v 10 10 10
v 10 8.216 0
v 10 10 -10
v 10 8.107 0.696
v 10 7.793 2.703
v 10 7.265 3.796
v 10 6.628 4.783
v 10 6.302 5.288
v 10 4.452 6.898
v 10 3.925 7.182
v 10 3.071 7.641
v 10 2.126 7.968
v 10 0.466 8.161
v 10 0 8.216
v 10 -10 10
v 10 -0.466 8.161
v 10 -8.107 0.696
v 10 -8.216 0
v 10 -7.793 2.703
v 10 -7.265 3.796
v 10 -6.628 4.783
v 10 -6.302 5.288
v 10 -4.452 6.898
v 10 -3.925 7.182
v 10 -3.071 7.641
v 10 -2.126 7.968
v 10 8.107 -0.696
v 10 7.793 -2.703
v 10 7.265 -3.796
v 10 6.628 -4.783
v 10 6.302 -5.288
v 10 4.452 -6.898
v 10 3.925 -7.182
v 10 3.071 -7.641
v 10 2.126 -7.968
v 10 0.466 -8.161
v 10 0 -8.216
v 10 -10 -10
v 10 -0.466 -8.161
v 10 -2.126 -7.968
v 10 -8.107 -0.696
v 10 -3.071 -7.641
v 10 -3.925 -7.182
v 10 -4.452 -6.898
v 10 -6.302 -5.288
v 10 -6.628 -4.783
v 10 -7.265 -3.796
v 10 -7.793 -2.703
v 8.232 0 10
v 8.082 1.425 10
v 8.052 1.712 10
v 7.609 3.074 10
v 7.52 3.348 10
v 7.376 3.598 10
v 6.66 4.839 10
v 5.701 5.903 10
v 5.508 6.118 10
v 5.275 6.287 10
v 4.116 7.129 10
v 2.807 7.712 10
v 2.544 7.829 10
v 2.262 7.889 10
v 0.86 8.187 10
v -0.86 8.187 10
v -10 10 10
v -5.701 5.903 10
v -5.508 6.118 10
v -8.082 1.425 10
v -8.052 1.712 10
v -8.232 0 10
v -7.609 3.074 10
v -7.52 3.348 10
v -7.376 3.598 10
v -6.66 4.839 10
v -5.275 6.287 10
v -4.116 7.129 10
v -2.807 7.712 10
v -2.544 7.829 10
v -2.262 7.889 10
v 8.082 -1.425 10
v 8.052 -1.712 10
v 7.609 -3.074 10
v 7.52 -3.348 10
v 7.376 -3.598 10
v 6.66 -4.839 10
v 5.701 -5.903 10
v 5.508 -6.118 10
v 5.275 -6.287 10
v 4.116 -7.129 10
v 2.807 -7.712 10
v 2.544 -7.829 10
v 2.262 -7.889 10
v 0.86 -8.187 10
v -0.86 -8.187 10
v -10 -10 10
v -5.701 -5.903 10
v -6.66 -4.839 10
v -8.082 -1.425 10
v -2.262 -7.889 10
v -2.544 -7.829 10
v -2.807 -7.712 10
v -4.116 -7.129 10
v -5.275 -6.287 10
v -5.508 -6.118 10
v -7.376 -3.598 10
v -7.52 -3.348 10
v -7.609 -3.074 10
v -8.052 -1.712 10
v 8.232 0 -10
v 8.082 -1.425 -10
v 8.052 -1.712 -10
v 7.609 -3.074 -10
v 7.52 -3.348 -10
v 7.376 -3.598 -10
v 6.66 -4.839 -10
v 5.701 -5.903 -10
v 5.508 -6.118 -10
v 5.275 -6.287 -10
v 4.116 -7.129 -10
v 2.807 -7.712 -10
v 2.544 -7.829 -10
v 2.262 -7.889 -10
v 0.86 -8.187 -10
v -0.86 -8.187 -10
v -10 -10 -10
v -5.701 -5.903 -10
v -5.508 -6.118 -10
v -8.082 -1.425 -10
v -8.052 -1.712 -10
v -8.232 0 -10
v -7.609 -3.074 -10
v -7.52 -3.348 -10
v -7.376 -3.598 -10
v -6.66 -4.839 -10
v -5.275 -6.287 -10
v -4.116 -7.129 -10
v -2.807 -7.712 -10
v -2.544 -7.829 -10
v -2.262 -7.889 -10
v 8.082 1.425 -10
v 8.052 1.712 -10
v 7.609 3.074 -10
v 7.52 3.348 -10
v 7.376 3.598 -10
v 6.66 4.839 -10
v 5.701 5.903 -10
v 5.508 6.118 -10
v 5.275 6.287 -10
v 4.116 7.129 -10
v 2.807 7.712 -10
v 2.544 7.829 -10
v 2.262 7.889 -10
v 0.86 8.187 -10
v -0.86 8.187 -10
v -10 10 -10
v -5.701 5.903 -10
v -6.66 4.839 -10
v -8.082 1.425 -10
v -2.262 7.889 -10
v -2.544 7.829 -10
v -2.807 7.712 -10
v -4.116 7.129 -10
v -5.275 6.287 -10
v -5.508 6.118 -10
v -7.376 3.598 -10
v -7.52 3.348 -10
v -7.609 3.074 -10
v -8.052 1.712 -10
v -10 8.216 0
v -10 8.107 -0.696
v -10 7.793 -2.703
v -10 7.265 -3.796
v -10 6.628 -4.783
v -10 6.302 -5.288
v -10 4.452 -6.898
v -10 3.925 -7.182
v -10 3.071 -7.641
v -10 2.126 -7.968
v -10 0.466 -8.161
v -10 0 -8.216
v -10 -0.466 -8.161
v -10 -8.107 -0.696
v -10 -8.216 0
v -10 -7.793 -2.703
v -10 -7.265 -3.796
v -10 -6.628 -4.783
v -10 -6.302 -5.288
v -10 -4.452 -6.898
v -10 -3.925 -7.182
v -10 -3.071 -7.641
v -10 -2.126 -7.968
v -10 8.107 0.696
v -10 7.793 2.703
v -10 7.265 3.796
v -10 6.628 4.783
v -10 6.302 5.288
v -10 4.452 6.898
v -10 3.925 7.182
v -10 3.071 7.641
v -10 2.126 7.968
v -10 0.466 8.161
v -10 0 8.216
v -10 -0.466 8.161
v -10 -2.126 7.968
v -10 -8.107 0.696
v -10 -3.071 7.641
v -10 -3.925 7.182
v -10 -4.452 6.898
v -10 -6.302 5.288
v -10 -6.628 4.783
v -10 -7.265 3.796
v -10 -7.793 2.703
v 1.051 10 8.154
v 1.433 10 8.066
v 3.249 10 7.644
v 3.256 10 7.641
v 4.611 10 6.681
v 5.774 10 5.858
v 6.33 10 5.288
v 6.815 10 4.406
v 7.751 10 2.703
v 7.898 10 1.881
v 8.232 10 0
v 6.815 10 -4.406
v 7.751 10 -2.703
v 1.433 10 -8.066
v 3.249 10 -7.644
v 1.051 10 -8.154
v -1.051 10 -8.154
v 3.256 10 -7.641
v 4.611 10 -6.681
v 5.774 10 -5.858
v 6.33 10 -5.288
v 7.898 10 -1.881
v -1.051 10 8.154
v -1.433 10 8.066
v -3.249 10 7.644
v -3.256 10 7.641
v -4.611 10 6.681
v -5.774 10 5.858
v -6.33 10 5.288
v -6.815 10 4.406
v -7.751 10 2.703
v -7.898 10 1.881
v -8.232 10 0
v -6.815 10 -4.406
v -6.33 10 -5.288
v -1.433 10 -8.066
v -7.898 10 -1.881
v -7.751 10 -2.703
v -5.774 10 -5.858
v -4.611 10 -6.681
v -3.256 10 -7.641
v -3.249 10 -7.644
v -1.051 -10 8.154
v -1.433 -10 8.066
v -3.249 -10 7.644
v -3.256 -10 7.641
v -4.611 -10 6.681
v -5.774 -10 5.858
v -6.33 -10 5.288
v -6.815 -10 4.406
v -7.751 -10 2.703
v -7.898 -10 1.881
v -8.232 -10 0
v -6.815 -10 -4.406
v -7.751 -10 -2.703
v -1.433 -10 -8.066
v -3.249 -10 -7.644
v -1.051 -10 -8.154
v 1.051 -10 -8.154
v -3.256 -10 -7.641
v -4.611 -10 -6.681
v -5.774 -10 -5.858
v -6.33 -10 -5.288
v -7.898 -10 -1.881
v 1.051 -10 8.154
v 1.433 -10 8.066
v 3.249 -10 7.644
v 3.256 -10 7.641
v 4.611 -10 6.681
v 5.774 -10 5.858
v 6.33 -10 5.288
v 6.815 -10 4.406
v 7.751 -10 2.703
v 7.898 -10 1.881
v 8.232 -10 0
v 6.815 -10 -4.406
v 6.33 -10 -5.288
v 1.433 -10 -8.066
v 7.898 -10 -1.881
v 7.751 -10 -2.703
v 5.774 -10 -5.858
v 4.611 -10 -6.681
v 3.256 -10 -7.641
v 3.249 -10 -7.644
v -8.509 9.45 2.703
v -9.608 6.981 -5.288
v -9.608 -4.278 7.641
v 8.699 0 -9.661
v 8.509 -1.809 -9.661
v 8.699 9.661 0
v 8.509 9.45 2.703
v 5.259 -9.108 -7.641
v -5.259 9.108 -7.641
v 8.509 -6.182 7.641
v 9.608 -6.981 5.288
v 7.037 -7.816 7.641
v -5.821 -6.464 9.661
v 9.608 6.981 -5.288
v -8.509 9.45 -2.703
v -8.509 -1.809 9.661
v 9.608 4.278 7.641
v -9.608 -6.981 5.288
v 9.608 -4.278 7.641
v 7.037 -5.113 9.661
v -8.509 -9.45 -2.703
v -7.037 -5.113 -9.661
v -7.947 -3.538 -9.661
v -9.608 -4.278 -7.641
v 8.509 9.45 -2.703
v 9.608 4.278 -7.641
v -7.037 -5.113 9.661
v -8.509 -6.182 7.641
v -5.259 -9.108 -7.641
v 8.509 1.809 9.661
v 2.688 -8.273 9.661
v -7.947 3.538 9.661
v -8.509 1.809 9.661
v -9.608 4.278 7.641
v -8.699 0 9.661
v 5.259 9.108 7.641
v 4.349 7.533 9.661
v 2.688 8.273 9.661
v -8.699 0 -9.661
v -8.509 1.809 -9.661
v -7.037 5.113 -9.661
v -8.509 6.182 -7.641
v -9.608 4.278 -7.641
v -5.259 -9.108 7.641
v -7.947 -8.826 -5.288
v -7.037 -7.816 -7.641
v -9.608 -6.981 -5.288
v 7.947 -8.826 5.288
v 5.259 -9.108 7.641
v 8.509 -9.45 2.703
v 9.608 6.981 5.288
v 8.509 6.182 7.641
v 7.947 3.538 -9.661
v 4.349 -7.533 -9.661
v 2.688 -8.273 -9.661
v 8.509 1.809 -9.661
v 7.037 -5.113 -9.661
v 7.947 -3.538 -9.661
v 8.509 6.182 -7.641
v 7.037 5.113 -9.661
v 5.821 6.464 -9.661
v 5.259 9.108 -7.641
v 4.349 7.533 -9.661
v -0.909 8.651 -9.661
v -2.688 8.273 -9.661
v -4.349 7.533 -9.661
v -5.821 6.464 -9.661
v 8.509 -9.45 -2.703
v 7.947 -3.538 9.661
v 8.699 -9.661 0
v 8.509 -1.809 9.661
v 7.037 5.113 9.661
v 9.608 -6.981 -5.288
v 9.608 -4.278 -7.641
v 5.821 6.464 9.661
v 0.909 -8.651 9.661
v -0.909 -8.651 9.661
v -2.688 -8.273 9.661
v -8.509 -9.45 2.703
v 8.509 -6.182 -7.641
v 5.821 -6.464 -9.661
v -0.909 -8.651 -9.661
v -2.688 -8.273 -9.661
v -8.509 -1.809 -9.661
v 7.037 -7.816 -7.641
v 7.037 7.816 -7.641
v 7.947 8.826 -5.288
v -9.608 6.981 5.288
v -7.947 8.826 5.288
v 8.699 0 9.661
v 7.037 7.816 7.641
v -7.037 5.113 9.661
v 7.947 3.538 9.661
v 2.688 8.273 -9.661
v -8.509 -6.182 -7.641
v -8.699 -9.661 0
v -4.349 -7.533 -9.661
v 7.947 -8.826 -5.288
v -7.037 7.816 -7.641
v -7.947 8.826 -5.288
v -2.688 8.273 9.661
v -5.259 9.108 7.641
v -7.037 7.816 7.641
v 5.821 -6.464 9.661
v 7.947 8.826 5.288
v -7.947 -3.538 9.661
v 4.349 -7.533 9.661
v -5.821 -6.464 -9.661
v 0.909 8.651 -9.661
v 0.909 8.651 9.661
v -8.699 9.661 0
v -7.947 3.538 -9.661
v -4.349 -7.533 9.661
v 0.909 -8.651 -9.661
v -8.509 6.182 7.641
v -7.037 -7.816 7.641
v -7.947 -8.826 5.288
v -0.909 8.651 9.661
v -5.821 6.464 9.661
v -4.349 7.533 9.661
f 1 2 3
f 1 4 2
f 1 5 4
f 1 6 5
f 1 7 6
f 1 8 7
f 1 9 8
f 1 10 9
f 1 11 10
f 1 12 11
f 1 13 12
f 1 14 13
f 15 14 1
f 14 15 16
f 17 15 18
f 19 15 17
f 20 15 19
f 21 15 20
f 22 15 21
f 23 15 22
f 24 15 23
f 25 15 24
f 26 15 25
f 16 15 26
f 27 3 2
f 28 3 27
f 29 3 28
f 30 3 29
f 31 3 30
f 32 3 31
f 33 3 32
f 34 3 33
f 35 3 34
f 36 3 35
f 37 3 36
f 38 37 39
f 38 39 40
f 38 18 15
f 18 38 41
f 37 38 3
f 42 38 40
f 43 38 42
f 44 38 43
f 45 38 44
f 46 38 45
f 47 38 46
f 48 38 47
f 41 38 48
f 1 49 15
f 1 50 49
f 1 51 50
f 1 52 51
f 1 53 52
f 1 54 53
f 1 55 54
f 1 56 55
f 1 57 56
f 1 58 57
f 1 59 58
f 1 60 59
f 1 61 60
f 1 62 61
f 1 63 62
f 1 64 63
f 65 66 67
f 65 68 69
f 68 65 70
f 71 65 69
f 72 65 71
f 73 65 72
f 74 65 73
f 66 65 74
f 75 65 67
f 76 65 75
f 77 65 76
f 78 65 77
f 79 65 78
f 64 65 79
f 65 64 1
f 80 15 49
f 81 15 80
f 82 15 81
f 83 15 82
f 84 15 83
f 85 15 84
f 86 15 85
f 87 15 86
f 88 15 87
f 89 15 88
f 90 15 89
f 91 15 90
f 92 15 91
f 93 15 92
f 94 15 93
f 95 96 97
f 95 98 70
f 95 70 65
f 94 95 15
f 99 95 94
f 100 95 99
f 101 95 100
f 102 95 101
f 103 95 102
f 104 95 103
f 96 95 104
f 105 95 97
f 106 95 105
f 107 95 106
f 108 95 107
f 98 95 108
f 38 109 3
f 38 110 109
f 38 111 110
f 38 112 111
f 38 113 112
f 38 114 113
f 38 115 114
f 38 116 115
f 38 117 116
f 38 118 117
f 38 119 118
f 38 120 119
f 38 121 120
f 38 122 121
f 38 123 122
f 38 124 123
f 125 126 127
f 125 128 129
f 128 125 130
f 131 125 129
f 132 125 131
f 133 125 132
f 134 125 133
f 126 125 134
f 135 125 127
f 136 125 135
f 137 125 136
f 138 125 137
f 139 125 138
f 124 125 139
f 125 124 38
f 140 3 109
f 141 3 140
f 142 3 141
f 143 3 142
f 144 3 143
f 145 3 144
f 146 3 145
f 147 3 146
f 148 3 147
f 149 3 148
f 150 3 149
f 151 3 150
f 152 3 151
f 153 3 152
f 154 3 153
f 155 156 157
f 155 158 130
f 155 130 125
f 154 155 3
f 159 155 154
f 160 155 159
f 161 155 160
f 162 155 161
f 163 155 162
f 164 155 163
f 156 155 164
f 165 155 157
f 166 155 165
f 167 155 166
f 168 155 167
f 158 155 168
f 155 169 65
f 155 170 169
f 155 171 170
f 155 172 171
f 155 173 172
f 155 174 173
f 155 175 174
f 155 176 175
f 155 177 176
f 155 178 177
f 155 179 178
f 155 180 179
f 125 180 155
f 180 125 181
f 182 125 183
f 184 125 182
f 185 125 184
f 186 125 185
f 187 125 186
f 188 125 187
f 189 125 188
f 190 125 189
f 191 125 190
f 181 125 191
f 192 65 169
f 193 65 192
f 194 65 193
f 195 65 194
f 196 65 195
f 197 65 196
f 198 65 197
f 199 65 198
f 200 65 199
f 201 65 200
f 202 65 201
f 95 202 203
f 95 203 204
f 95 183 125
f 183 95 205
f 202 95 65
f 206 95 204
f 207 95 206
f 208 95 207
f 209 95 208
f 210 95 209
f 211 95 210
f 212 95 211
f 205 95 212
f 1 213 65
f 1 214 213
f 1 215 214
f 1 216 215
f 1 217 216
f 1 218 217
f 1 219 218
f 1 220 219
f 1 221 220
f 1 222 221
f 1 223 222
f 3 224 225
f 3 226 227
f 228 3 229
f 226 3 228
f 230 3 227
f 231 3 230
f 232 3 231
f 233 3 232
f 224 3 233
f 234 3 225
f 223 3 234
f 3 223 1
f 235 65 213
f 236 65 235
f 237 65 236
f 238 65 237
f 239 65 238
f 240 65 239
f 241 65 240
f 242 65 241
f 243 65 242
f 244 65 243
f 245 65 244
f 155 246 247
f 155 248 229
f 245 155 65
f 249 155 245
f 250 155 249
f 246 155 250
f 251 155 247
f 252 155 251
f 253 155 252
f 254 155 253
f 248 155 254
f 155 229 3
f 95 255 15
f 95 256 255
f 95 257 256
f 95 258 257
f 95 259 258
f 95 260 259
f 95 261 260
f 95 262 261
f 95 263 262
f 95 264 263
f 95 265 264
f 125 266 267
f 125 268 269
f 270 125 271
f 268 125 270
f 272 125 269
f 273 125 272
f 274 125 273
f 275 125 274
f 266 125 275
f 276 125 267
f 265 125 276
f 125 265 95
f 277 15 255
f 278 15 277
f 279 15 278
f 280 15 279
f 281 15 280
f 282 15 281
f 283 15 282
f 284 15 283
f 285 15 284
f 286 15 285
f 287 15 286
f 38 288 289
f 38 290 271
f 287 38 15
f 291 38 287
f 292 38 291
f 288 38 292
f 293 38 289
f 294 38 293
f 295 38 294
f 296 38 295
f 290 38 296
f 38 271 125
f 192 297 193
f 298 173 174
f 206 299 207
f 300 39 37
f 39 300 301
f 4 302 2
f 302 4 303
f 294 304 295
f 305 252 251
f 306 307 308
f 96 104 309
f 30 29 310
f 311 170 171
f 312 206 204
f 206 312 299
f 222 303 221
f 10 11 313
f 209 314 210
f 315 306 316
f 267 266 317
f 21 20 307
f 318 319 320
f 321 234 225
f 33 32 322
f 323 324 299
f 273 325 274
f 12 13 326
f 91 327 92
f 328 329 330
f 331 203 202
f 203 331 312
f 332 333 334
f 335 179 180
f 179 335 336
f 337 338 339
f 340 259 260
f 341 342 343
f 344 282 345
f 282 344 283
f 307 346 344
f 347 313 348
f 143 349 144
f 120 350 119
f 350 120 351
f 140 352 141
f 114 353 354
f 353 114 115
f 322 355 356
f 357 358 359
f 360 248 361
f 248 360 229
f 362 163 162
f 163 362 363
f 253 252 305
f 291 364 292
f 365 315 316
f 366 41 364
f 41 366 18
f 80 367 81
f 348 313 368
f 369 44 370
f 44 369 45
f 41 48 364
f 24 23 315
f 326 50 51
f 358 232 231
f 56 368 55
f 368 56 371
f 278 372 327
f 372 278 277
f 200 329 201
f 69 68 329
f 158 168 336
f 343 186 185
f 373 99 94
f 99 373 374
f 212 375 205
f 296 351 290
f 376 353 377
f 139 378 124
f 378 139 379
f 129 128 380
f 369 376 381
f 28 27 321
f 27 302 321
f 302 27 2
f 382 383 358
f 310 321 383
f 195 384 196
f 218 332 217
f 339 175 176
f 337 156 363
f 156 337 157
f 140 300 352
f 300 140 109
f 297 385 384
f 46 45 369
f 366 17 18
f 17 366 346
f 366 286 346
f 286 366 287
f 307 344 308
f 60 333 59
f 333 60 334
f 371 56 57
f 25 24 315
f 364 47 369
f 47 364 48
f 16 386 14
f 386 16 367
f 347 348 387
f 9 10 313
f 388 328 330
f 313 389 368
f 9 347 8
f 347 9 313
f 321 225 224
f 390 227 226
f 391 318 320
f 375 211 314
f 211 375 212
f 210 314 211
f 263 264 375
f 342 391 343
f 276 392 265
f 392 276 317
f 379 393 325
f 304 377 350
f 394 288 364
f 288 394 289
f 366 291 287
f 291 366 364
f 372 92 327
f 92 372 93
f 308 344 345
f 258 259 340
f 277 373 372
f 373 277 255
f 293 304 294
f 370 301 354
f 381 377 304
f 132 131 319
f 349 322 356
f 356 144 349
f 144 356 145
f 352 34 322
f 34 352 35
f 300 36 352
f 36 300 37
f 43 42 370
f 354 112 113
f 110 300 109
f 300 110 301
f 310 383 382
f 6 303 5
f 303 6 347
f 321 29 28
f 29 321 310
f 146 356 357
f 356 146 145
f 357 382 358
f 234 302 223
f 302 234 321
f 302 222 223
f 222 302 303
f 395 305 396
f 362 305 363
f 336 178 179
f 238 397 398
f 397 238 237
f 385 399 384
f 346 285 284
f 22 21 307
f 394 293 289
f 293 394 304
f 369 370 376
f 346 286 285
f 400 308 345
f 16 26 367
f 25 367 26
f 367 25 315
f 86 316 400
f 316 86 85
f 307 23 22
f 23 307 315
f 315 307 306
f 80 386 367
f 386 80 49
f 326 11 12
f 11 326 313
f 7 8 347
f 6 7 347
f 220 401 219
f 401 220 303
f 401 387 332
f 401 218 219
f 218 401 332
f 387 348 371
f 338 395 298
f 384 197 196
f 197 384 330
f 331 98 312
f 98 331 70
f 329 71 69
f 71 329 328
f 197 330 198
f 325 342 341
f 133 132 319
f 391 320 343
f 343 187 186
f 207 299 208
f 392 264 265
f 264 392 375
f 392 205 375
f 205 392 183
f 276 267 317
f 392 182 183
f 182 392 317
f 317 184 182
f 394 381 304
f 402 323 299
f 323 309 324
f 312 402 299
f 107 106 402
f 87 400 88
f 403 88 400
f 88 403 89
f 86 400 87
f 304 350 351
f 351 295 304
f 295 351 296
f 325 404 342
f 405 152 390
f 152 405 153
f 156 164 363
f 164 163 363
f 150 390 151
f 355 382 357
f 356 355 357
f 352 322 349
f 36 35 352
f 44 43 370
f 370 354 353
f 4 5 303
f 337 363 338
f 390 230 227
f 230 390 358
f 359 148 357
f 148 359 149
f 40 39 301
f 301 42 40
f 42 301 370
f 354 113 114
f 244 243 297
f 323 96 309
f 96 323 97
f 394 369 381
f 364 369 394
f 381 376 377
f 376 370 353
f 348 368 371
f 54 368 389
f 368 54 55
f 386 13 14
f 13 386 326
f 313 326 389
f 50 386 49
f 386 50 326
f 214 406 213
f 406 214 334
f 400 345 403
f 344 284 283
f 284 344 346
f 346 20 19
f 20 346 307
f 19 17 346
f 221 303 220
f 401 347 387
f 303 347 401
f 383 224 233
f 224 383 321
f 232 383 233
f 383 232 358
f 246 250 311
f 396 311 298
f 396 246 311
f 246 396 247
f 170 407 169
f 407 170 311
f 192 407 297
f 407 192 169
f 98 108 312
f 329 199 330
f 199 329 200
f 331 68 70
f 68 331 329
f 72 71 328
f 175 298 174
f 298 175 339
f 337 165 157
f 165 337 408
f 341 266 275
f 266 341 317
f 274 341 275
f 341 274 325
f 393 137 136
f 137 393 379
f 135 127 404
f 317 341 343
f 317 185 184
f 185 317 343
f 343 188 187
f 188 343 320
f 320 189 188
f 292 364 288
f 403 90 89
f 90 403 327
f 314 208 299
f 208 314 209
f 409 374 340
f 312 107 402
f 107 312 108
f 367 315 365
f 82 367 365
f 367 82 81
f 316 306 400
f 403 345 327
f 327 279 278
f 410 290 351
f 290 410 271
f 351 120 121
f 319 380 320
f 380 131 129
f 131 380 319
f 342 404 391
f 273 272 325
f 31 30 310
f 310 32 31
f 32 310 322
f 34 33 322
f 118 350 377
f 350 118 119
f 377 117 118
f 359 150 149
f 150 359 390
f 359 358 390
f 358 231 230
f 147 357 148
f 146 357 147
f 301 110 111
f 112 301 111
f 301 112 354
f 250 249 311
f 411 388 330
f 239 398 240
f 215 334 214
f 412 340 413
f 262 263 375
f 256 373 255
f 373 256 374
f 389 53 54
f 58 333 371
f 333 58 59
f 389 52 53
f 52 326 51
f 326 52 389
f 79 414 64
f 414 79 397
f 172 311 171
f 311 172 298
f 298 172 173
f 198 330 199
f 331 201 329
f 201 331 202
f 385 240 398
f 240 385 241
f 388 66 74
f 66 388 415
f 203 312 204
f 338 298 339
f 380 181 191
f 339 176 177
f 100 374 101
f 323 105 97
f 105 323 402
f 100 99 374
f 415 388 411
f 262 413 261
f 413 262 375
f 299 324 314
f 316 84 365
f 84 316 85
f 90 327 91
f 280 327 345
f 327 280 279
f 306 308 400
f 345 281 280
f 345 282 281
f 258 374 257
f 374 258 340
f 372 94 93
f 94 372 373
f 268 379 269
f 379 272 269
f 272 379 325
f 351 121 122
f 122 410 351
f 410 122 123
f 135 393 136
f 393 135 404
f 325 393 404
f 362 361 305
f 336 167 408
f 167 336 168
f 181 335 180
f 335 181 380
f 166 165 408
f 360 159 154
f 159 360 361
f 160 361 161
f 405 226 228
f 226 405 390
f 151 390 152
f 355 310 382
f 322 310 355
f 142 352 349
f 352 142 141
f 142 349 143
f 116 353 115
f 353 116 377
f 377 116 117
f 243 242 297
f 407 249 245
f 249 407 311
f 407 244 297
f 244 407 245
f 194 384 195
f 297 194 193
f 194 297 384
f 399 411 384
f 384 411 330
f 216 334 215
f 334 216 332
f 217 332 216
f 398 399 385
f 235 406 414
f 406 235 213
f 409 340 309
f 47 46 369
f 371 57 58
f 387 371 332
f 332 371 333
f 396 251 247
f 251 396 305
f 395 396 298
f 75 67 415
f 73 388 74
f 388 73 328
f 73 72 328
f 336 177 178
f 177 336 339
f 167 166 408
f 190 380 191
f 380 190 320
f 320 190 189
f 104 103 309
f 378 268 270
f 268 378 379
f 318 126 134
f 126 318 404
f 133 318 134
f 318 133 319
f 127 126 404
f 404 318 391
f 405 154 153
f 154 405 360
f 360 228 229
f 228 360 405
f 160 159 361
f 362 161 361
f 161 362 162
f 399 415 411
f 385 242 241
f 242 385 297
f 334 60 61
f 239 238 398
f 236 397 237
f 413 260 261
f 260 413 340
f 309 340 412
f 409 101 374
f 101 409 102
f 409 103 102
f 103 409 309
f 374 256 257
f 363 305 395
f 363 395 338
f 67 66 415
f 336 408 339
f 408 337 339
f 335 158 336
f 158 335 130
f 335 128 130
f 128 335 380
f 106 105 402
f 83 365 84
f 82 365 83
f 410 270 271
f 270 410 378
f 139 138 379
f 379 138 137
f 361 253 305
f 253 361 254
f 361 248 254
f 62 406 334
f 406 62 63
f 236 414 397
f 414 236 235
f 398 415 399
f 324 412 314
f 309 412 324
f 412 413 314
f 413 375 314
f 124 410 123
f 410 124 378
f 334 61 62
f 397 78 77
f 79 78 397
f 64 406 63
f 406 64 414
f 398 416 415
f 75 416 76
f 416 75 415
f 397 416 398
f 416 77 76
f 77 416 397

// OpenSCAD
difference() {
    cube([20, 20, 20], center = true);
    sphere(r = 13);
}
